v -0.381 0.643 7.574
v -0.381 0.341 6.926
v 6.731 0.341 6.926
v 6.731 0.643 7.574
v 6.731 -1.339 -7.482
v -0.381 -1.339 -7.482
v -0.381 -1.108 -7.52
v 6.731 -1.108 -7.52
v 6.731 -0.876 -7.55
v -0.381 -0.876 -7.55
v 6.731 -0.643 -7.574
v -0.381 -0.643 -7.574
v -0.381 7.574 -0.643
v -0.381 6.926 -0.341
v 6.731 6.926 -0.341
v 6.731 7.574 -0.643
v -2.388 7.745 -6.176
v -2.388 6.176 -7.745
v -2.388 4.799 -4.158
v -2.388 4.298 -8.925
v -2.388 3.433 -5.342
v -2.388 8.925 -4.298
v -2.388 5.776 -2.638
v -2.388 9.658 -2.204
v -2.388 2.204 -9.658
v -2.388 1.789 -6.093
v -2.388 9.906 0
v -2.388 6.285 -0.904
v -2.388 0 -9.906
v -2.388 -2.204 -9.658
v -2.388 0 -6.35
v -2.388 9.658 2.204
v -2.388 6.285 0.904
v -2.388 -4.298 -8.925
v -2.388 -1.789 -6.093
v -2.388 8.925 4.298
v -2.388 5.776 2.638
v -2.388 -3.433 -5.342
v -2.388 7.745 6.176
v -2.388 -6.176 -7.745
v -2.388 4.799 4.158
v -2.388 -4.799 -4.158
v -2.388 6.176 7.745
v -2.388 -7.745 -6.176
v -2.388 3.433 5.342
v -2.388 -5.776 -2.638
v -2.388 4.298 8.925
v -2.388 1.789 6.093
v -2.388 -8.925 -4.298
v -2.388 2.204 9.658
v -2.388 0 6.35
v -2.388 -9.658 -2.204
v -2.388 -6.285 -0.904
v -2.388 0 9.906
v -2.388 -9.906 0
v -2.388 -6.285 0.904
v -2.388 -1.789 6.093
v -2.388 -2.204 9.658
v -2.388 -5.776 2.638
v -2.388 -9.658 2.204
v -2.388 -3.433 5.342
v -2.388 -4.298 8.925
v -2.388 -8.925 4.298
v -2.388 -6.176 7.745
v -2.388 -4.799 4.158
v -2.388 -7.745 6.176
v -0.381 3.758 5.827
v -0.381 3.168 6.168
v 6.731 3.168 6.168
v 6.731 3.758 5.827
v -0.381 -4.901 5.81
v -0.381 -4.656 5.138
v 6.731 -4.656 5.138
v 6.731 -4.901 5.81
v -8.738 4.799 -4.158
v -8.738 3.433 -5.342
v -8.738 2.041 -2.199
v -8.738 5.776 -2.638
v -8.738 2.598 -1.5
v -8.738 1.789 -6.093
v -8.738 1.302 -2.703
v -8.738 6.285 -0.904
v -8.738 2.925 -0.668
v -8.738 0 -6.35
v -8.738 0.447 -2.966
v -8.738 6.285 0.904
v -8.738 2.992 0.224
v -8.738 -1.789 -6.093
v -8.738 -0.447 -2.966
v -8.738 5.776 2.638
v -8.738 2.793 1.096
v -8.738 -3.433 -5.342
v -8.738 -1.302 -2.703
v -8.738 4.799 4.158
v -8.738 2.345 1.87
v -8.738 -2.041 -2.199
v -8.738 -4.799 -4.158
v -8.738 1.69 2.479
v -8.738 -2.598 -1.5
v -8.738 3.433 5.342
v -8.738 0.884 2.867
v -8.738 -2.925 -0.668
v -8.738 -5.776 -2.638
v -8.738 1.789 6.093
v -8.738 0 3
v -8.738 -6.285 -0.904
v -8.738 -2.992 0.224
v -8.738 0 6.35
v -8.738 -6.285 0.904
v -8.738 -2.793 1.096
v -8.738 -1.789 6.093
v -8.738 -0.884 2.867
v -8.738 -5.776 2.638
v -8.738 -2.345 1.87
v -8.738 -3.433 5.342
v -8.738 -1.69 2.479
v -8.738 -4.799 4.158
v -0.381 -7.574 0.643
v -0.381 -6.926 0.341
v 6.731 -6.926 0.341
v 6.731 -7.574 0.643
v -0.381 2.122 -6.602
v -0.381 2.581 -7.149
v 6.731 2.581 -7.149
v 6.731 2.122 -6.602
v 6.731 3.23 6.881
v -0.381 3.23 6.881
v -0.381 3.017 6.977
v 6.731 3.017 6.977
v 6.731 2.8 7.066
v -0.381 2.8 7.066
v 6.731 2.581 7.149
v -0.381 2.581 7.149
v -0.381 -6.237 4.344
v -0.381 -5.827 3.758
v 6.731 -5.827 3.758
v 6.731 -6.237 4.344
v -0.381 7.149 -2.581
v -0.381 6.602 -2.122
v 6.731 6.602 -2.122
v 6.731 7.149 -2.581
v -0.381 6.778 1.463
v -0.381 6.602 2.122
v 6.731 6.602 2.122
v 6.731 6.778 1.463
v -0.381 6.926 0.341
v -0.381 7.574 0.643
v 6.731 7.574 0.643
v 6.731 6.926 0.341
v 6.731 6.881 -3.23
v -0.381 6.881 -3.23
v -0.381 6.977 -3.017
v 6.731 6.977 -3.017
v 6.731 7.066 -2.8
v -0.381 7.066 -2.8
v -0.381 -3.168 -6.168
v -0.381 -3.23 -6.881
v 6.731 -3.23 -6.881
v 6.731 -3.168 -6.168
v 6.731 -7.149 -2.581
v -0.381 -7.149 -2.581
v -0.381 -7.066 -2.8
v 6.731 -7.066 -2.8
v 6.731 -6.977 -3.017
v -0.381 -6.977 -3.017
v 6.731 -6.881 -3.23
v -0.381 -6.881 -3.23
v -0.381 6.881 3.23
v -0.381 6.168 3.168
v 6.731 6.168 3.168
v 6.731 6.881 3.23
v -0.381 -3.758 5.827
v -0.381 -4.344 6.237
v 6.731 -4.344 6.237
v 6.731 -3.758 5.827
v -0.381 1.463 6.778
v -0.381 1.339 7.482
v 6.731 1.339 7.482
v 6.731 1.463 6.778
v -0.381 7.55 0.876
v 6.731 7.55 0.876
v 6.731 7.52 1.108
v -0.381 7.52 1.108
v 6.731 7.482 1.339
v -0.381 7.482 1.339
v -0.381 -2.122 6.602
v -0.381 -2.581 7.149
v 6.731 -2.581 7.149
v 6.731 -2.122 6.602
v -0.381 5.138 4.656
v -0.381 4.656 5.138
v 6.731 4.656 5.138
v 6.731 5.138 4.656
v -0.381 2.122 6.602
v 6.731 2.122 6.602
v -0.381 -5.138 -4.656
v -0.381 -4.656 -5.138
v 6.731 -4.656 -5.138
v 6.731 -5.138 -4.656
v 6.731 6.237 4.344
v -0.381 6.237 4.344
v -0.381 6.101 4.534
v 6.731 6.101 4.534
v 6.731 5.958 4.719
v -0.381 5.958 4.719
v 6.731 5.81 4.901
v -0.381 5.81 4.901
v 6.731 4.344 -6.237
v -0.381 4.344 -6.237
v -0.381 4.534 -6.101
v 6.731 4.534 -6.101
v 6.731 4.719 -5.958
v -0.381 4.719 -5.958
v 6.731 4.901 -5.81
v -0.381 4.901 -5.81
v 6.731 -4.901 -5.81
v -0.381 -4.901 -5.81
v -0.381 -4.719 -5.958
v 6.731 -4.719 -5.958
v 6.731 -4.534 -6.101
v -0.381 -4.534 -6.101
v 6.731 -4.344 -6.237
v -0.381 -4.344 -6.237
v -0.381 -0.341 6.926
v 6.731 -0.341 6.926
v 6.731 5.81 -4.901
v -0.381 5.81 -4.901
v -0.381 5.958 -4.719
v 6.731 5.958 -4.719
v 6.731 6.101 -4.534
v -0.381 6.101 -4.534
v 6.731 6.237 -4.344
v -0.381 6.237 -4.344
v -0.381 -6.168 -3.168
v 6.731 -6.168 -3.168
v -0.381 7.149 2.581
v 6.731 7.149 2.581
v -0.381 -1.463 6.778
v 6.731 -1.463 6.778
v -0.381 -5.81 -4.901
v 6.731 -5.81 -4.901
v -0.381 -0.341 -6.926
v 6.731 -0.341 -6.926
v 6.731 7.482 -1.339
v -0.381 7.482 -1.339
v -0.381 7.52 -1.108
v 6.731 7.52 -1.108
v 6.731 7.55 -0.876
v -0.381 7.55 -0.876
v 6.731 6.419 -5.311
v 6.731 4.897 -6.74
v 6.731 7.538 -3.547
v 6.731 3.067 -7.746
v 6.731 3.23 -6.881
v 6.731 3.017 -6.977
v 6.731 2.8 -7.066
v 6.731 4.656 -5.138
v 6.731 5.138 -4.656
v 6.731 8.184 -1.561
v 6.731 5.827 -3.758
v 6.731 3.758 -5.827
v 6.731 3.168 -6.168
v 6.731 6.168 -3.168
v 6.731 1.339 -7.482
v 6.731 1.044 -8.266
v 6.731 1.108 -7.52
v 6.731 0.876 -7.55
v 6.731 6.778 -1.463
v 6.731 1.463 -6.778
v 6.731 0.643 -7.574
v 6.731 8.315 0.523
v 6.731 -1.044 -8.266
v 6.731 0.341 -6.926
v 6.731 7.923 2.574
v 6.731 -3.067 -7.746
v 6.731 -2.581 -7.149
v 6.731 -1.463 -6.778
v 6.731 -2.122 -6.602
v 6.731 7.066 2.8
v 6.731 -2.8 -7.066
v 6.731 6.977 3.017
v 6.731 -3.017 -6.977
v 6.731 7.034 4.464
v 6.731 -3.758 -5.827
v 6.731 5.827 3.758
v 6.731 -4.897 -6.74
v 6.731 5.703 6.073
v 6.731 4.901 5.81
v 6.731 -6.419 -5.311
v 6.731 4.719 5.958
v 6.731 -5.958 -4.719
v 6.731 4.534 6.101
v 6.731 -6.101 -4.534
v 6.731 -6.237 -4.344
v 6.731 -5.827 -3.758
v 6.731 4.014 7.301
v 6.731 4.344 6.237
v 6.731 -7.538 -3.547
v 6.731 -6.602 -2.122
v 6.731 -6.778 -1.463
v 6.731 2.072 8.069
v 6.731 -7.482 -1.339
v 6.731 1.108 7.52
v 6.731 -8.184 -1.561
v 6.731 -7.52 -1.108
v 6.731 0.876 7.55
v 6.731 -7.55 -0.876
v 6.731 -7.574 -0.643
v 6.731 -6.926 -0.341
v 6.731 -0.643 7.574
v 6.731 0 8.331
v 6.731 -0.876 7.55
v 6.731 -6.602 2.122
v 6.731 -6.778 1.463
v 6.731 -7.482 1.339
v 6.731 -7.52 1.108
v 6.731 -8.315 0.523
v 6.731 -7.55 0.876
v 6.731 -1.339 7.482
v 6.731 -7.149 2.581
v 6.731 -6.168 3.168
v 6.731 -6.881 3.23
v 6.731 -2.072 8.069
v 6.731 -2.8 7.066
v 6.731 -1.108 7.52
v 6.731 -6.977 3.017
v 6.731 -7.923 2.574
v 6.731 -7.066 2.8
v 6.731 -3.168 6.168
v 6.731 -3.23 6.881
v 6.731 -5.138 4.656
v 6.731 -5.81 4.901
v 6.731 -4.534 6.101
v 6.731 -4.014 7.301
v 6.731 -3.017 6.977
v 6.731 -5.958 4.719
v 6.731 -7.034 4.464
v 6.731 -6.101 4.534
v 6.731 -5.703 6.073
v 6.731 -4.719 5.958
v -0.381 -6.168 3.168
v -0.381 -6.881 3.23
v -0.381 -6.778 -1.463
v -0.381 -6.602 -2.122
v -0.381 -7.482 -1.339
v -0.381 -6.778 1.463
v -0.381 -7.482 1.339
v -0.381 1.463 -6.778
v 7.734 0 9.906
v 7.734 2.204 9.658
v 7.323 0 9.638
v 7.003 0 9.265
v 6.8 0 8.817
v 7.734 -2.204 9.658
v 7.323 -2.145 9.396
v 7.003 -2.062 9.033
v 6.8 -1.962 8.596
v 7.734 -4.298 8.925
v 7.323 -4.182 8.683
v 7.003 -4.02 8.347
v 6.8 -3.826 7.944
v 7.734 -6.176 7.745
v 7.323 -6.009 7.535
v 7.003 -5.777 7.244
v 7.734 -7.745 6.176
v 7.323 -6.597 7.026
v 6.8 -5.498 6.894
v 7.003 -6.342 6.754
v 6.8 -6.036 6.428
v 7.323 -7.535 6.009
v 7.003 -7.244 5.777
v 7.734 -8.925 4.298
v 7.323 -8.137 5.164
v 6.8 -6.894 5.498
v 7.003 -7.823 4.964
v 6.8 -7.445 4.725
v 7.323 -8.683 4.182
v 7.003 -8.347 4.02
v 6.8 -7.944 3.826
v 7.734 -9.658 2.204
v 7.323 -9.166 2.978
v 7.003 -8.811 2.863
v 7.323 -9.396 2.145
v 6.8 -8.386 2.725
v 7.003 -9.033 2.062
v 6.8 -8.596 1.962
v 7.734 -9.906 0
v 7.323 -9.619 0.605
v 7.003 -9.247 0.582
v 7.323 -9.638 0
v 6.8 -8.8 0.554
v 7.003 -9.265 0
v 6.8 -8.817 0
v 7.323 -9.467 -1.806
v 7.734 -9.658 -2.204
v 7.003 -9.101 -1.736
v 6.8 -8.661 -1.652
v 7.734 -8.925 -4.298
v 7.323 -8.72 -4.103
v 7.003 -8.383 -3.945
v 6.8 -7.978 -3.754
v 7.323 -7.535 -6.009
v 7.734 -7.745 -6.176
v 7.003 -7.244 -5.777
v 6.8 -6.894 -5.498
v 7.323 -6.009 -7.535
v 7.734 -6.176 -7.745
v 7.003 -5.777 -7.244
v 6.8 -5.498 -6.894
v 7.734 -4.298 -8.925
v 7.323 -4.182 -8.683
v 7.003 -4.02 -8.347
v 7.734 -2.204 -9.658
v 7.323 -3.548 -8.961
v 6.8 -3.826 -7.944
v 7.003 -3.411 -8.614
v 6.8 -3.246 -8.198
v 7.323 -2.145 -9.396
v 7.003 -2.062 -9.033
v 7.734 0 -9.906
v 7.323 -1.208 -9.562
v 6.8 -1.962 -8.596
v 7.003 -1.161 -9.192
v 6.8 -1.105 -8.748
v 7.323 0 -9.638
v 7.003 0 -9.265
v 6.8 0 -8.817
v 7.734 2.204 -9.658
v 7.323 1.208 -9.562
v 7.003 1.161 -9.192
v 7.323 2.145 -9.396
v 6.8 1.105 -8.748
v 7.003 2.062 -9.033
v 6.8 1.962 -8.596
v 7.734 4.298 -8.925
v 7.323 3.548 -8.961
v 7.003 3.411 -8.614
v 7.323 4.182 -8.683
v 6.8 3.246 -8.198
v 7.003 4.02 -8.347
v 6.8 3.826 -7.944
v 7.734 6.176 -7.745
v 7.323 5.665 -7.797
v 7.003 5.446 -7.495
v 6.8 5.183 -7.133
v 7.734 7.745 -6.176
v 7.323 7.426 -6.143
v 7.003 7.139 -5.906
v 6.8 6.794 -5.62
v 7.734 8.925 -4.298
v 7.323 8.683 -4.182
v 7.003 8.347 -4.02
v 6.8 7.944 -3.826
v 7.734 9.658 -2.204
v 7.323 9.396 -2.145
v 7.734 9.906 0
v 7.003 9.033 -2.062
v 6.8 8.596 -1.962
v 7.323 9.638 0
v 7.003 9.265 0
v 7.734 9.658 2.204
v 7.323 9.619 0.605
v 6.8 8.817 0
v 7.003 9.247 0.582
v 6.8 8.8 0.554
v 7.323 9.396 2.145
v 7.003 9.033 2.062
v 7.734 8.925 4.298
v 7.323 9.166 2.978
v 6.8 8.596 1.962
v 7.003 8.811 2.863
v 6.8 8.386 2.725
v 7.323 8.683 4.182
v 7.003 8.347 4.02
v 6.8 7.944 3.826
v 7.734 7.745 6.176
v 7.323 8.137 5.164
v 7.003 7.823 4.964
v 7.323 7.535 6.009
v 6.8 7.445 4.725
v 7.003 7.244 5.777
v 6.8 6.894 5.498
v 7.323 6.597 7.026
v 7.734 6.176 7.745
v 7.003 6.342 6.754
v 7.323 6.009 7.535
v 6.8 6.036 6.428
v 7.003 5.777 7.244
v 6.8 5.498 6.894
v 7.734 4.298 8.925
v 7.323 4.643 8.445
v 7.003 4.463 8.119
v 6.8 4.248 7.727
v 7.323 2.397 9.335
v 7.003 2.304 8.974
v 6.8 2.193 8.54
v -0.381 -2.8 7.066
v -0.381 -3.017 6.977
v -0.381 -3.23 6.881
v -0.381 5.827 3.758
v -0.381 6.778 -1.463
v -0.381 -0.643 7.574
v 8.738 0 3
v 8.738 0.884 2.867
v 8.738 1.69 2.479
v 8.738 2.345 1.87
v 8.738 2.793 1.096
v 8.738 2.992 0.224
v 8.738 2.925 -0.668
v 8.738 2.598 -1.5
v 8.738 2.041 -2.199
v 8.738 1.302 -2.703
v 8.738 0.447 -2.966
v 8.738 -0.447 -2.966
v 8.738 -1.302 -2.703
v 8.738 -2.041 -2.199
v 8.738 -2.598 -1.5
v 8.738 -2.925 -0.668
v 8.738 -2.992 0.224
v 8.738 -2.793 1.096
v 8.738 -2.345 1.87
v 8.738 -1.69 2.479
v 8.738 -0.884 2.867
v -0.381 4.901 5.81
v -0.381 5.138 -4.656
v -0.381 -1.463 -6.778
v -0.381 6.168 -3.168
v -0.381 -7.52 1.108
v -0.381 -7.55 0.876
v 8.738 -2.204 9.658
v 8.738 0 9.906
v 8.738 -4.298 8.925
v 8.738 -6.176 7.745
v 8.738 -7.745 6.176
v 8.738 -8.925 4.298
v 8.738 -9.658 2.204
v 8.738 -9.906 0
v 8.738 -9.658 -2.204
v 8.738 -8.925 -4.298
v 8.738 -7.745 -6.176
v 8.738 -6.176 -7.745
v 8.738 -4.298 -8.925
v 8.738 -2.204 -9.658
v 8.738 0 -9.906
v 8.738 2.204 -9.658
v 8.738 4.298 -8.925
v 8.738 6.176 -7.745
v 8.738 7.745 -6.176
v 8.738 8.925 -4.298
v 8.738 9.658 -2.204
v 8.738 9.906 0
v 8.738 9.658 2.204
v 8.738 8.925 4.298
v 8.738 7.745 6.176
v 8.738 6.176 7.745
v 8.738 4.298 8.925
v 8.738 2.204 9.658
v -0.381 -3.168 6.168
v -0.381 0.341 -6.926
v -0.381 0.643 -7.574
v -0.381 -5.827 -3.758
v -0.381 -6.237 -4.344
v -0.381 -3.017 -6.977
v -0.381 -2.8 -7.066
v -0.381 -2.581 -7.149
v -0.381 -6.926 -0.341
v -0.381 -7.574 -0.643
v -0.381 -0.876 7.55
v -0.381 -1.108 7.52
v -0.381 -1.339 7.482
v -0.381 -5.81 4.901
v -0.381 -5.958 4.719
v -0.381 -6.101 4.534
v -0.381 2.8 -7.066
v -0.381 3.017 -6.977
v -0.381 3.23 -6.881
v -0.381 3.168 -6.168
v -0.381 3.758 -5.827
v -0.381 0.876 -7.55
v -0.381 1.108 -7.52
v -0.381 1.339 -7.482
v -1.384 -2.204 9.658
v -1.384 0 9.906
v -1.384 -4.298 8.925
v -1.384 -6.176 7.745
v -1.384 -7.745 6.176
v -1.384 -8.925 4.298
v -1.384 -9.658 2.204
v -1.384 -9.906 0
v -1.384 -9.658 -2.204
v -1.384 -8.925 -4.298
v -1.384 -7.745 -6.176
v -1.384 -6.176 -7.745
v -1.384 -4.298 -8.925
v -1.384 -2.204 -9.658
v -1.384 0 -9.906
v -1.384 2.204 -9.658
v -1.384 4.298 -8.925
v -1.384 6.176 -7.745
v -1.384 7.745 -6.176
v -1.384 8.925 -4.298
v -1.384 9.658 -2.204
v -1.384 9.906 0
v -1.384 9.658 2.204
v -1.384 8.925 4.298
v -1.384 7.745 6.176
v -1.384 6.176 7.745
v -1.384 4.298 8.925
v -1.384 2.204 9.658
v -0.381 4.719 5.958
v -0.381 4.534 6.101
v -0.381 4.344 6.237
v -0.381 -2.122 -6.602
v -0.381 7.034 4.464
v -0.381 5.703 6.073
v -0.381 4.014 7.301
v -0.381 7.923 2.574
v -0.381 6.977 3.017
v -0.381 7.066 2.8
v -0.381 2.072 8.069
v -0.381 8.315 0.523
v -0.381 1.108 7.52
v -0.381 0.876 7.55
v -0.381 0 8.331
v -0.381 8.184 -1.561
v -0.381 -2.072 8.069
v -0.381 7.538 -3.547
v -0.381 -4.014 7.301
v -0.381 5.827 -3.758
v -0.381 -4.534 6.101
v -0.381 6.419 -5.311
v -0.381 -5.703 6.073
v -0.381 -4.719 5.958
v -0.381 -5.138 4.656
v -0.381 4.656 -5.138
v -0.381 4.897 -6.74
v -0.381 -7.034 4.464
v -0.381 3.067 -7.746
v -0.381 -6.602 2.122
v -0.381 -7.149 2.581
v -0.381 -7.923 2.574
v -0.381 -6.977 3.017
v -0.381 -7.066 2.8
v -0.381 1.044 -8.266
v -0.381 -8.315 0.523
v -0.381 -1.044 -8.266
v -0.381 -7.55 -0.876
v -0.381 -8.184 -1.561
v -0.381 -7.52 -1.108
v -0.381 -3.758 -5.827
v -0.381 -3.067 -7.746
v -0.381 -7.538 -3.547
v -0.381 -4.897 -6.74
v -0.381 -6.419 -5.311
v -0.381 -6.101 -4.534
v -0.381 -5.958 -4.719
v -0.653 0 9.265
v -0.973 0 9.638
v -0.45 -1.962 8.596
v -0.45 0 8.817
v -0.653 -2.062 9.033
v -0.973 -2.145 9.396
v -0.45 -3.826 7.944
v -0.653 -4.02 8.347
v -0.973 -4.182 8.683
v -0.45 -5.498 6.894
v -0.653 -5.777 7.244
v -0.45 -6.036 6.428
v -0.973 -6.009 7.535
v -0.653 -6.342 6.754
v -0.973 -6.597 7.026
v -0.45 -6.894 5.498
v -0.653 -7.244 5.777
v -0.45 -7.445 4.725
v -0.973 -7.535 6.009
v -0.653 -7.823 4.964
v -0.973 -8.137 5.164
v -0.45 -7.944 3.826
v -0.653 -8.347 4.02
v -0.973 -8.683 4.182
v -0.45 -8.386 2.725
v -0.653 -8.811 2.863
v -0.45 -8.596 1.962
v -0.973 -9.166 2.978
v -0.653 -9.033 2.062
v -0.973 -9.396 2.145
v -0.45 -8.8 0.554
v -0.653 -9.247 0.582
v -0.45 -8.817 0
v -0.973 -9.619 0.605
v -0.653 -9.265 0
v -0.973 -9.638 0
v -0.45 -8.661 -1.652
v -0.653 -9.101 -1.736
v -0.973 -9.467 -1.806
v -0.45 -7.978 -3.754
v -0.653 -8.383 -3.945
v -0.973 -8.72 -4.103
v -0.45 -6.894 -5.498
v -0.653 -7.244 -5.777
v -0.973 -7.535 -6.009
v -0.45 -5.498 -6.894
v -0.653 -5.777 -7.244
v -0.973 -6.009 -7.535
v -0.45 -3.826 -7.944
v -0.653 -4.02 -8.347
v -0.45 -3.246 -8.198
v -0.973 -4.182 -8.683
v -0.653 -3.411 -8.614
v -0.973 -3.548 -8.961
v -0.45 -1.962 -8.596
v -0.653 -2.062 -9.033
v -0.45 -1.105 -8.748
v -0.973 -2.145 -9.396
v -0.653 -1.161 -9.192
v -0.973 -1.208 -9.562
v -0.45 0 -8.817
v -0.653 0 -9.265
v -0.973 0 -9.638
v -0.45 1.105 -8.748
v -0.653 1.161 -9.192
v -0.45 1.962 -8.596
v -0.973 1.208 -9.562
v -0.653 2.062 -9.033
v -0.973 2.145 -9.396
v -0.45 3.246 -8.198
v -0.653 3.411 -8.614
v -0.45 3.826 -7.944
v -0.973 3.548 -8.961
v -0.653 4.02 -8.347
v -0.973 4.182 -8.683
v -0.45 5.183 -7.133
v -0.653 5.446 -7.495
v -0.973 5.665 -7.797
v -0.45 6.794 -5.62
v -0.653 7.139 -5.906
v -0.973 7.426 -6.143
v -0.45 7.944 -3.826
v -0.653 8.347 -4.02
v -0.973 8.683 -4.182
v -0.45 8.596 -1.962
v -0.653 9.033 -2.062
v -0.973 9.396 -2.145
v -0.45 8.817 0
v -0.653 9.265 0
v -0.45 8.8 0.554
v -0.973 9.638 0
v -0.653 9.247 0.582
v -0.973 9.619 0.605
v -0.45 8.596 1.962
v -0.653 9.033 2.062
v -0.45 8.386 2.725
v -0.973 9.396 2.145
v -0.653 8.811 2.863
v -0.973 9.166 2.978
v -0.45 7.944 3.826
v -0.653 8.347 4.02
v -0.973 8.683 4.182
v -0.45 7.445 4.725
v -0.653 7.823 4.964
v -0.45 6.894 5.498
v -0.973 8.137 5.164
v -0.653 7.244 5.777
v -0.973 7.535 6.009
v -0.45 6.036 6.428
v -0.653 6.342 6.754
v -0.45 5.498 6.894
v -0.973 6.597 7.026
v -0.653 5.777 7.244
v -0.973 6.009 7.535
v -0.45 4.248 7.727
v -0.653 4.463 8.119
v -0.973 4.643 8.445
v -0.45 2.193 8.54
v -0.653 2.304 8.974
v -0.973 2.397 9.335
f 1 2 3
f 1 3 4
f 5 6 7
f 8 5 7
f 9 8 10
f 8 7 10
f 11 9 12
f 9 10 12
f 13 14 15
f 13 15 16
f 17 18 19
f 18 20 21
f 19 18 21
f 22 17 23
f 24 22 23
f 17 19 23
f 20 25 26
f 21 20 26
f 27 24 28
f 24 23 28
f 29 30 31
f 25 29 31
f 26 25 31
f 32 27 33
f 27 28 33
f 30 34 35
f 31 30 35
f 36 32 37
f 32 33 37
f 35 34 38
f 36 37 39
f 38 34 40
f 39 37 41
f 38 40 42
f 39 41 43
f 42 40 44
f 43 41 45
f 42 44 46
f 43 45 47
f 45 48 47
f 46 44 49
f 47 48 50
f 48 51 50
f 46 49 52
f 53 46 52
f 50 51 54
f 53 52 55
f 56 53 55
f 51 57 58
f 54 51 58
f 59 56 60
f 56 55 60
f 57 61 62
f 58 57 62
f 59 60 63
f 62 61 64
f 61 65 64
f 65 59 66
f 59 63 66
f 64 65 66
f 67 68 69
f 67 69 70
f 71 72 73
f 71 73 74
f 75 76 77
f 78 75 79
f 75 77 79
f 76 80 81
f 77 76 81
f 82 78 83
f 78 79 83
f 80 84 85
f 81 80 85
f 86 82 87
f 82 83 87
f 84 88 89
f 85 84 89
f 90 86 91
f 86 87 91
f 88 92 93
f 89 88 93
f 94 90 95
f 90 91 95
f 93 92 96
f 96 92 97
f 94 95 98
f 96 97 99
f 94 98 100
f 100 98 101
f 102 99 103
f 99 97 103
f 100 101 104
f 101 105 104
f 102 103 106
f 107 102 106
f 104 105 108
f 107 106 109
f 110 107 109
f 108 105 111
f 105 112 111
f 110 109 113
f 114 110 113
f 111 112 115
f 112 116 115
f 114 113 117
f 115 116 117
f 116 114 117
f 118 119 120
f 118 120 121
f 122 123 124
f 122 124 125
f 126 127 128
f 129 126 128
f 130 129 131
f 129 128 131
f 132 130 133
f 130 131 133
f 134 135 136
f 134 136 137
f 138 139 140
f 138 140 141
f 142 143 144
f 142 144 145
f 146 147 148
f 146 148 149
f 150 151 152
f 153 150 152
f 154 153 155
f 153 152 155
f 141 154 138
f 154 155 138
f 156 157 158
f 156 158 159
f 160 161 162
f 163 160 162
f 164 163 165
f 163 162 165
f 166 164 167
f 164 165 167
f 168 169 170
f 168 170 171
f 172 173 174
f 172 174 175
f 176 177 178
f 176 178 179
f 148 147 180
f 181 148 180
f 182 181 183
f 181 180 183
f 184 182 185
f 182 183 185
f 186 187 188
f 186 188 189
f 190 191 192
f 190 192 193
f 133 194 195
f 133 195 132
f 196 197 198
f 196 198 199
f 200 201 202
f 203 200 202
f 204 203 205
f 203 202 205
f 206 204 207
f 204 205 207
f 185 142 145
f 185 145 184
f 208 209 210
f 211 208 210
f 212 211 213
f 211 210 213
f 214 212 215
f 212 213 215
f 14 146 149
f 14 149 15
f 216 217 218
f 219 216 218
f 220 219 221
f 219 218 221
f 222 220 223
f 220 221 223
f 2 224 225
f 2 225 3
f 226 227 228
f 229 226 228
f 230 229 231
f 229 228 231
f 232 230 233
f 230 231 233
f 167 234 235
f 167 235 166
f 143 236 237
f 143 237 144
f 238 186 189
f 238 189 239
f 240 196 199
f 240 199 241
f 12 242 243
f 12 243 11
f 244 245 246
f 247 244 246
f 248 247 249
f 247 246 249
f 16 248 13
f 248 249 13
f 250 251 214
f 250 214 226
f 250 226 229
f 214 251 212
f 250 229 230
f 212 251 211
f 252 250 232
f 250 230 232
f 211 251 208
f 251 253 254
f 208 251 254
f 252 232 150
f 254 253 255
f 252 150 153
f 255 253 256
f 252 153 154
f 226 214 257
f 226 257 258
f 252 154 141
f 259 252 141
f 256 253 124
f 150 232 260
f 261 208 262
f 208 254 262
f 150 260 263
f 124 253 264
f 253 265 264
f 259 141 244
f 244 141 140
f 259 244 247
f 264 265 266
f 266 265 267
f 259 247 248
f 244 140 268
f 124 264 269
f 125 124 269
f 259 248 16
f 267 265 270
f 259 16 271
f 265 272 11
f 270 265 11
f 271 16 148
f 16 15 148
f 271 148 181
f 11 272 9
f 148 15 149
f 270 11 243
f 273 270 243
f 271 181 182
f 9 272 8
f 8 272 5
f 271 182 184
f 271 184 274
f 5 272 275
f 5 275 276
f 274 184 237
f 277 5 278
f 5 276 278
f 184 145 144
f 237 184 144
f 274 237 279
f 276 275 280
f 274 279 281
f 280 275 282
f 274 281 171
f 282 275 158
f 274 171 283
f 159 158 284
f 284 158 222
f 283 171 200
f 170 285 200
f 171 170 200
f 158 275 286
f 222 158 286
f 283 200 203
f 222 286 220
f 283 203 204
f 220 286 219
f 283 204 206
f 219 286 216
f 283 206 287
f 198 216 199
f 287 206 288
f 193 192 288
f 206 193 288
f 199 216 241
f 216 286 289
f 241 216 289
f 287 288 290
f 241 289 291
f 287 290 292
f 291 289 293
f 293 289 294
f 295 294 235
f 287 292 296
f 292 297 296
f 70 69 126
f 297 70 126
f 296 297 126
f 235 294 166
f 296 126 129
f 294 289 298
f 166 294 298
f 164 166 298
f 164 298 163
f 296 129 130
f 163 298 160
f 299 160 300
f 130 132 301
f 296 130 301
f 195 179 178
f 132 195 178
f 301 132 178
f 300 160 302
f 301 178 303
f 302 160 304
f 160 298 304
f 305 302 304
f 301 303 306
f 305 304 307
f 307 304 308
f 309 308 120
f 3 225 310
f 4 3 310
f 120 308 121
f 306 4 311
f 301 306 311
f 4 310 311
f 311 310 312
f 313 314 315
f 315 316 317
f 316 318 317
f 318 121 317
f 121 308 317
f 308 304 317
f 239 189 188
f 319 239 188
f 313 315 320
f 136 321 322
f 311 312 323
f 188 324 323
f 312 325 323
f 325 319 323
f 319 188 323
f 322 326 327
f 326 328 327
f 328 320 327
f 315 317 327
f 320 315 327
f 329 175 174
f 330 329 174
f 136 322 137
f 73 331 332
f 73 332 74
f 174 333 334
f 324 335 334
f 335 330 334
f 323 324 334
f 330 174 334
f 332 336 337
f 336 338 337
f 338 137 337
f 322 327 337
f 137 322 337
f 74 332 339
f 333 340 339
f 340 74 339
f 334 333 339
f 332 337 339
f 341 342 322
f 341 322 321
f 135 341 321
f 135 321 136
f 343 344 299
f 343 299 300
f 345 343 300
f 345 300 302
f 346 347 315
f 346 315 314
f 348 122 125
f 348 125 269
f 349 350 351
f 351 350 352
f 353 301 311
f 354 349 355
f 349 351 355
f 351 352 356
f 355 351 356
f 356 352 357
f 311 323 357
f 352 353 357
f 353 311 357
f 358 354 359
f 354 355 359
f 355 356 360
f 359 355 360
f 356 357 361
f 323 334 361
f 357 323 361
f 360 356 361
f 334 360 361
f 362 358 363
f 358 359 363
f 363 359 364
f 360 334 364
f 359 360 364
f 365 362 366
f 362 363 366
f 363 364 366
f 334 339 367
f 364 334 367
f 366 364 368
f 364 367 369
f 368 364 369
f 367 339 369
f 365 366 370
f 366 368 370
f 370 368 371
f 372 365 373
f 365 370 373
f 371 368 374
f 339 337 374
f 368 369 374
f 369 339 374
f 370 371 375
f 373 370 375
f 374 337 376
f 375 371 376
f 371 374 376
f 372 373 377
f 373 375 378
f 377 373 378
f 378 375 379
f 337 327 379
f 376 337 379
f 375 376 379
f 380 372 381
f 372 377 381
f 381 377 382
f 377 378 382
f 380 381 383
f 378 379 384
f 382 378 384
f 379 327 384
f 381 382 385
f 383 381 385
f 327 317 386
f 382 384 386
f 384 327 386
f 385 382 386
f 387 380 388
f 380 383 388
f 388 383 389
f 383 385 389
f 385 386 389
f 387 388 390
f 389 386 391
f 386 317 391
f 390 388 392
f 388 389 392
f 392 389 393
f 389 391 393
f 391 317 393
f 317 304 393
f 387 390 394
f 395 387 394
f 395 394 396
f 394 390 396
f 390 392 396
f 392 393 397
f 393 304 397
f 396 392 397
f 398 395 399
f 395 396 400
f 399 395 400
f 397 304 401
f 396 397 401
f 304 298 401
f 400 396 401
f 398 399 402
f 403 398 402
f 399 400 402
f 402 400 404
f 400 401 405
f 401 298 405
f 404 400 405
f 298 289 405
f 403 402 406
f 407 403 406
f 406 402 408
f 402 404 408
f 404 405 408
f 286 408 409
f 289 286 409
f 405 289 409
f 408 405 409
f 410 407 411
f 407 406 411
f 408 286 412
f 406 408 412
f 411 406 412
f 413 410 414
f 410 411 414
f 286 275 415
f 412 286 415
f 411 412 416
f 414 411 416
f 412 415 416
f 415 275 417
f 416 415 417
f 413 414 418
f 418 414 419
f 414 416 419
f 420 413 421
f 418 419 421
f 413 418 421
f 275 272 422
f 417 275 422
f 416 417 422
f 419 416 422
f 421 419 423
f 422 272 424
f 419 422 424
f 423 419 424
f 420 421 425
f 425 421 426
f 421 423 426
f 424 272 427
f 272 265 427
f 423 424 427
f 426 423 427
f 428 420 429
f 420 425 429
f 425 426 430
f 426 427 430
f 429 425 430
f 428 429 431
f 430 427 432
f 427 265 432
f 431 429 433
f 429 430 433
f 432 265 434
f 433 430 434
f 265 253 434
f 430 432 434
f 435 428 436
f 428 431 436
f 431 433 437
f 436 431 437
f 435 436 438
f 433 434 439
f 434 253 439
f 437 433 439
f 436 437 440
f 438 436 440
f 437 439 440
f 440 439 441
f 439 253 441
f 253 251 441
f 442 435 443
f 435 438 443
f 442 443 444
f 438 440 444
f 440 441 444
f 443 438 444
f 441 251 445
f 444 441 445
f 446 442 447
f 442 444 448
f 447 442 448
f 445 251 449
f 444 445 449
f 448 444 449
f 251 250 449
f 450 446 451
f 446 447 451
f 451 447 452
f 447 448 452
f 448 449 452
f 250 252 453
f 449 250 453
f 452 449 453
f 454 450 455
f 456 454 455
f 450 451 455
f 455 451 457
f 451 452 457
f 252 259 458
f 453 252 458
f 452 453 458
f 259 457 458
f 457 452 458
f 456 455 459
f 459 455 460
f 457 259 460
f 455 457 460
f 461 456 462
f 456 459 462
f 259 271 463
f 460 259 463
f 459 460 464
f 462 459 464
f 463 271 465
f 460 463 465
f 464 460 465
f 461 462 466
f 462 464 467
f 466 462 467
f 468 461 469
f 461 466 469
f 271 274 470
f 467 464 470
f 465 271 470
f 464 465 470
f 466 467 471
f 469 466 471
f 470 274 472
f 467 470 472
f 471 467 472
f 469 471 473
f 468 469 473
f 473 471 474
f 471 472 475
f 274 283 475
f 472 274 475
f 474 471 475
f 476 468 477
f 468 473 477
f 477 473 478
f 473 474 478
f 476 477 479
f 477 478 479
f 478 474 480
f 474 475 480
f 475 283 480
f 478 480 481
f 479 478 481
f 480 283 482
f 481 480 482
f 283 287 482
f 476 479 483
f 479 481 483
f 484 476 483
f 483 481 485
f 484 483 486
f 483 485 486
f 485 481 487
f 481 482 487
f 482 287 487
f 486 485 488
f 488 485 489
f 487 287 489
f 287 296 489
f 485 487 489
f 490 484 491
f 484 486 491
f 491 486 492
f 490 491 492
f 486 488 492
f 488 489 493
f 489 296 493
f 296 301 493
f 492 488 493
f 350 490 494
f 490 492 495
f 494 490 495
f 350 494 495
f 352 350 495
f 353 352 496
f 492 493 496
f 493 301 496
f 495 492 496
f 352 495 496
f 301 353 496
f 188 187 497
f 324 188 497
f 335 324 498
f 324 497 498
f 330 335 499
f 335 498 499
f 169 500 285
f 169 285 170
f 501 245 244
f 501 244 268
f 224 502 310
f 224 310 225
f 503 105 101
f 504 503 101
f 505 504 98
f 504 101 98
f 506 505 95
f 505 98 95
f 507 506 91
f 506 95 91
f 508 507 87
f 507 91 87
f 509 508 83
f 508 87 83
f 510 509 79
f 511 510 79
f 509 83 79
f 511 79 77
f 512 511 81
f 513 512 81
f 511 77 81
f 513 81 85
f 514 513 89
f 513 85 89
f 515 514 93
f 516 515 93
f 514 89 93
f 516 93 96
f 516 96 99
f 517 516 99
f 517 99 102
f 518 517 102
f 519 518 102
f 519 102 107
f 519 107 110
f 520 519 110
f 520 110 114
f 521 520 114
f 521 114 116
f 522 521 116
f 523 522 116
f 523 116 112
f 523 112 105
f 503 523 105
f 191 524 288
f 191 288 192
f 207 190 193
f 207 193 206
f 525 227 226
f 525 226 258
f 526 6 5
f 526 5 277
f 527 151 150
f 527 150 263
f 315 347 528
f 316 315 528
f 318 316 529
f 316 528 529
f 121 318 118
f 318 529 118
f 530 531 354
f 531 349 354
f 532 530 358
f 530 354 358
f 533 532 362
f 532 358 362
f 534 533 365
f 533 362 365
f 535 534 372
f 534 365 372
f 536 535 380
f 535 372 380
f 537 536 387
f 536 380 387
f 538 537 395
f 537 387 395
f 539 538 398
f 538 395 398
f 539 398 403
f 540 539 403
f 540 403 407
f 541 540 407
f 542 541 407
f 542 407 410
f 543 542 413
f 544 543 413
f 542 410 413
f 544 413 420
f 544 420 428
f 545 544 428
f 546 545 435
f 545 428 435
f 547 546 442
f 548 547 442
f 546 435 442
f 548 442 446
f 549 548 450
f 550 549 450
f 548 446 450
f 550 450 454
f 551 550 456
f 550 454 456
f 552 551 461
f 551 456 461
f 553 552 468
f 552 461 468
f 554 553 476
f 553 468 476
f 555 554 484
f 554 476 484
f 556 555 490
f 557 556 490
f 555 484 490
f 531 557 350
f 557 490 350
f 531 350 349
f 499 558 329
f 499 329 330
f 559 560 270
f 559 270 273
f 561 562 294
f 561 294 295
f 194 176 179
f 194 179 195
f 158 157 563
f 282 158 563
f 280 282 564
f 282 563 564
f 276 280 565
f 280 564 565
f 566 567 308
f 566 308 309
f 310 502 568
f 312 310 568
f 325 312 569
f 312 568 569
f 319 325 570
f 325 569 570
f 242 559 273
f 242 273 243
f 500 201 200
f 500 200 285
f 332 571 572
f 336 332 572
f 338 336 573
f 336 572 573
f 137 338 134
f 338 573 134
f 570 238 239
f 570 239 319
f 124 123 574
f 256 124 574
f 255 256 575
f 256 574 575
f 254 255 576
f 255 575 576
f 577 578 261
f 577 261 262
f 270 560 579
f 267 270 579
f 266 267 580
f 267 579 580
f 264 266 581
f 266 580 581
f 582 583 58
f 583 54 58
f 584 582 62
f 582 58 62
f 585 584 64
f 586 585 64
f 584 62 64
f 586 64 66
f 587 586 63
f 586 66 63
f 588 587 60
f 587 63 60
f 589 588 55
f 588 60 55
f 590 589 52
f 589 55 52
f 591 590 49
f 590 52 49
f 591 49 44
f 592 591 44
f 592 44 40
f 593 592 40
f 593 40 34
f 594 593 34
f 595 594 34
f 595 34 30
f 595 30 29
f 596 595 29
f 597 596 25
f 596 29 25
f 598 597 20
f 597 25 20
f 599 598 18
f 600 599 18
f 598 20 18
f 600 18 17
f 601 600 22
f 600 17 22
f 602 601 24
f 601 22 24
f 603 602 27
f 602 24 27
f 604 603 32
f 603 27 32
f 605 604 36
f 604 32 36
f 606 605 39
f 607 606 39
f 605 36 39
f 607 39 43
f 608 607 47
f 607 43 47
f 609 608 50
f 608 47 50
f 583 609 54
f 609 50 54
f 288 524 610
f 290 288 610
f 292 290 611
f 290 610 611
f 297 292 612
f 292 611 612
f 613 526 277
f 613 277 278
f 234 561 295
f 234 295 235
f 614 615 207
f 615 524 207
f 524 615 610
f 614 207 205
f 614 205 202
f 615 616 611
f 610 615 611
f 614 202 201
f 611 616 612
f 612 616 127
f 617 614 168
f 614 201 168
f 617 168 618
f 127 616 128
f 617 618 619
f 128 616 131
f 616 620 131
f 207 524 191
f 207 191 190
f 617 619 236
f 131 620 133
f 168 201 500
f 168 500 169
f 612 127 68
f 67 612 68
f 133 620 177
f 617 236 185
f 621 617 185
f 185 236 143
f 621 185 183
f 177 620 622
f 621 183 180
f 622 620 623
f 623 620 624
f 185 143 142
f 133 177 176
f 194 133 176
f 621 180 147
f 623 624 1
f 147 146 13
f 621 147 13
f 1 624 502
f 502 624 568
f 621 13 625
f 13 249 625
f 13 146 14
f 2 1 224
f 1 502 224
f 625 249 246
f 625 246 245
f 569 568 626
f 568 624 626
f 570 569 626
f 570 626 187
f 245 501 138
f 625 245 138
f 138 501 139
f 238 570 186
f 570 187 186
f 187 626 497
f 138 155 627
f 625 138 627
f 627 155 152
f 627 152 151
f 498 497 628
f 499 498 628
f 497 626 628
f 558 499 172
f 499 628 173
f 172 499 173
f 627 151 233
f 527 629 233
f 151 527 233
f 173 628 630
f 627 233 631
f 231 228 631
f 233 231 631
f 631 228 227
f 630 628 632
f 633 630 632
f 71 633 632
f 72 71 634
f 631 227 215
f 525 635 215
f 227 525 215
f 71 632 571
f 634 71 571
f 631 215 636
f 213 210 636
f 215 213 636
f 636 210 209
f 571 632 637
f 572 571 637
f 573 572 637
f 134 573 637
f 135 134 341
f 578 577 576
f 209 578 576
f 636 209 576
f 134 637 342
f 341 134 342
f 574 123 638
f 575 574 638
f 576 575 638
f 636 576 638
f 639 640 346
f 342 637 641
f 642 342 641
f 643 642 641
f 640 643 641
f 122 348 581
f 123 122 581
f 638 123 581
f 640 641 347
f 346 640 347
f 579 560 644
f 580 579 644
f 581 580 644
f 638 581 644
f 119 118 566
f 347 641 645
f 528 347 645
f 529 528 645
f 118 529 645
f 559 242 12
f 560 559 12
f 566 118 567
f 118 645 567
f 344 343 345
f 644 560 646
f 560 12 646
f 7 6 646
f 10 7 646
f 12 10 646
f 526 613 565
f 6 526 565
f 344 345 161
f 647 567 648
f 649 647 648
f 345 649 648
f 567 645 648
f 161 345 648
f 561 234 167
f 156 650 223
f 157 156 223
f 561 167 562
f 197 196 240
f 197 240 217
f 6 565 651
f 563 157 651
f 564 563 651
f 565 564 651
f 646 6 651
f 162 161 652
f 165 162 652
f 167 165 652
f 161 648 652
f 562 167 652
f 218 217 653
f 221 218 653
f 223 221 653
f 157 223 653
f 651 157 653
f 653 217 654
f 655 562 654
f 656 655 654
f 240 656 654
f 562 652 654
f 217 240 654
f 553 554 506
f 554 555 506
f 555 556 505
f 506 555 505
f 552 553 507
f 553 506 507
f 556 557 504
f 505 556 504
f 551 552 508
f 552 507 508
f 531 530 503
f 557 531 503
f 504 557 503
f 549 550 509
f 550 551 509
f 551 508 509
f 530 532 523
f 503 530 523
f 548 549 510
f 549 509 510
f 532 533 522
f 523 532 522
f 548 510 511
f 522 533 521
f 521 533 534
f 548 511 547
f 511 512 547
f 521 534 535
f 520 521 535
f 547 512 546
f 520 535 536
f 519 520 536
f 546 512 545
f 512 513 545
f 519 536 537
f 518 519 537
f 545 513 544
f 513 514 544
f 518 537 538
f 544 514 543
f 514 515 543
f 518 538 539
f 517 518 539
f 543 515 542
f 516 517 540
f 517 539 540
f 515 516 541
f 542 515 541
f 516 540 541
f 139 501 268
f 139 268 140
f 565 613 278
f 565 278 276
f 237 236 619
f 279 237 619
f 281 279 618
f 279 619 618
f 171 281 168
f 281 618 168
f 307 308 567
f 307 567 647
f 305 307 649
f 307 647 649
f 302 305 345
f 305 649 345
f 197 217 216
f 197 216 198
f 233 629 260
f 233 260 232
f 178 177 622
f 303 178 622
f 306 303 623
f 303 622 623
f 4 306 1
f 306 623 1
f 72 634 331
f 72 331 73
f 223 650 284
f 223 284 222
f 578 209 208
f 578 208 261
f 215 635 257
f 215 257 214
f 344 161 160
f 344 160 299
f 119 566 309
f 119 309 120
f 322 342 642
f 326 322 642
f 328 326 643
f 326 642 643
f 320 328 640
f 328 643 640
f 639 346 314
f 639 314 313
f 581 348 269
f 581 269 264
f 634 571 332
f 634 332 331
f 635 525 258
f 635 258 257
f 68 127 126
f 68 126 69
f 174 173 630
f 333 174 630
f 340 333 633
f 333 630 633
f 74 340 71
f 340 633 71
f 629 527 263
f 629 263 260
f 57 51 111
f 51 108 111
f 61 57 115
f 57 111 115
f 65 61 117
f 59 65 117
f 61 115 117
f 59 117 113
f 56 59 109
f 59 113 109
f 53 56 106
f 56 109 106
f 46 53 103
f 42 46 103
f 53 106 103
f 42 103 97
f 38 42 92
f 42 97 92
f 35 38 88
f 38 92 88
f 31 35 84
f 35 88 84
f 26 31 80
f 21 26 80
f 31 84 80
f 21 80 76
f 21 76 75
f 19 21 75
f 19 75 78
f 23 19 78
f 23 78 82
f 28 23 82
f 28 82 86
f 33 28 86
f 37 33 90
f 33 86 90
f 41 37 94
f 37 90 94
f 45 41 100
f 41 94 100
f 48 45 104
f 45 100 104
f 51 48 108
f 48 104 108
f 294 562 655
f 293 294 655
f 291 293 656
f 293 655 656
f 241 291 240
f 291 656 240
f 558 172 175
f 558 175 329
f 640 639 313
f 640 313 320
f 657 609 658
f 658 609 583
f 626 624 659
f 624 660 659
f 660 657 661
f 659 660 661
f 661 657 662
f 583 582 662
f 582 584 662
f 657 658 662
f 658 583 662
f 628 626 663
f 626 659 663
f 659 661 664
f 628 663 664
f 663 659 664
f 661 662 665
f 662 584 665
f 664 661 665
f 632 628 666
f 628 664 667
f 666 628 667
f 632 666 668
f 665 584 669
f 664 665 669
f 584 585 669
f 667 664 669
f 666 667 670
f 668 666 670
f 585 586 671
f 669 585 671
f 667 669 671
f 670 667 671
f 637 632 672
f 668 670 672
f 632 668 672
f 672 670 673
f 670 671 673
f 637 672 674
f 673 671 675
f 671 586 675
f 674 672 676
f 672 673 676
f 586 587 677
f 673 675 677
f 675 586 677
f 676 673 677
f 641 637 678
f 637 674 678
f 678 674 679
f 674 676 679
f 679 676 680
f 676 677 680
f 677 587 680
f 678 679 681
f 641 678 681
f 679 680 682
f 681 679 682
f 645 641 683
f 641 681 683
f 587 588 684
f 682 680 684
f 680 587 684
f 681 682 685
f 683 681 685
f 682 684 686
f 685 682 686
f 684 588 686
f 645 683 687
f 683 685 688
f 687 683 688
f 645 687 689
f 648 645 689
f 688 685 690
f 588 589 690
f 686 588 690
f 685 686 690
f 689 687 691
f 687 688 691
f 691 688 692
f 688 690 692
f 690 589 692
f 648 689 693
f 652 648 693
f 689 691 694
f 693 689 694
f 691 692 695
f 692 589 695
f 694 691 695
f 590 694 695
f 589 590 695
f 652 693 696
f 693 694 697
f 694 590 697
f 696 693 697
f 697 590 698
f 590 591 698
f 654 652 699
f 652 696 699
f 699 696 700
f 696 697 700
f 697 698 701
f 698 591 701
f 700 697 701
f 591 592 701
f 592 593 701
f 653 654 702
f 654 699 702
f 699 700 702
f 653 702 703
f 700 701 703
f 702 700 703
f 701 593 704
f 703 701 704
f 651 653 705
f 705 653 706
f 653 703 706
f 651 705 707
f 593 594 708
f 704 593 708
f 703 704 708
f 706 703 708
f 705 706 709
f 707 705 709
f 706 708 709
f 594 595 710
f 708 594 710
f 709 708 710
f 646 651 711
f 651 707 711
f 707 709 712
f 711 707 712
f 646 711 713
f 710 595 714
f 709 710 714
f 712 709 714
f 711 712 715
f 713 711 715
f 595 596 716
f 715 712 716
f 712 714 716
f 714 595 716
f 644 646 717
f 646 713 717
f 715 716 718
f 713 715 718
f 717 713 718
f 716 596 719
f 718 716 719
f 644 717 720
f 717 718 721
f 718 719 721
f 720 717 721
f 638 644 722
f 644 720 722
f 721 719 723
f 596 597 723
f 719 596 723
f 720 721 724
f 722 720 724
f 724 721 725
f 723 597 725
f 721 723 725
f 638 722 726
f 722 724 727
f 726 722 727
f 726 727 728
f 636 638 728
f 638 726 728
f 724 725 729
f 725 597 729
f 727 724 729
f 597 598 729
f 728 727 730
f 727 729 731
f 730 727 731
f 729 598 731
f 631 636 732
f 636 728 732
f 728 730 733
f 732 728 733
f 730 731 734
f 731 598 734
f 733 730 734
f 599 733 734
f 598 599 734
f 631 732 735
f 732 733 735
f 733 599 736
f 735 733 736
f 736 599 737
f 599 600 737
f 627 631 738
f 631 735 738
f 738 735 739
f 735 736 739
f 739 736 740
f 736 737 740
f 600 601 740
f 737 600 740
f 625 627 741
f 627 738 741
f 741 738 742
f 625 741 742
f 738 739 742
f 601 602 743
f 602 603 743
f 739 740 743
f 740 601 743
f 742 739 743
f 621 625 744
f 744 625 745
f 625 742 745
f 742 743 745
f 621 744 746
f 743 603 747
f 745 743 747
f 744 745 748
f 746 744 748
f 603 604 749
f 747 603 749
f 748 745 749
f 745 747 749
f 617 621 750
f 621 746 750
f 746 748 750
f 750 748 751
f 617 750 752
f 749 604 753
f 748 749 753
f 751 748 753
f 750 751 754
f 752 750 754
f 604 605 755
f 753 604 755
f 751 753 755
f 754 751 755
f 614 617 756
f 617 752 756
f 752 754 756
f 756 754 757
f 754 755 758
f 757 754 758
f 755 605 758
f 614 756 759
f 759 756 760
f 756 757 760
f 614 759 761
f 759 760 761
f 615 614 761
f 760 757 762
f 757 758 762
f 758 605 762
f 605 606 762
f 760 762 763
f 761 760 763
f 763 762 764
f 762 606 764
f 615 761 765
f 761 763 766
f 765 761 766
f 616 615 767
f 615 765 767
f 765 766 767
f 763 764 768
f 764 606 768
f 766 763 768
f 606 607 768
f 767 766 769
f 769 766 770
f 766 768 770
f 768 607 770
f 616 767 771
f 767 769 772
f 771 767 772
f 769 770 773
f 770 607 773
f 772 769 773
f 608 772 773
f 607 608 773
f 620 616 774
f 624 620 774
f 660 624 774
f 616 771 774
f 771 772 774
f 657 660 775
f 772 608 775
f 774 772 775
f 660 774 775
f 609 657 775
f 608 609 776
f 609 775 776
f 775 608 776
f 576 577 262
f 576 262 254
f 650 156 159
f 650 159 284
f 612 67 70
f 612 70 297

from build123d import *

# Parameters (mm, degrees)
SKETCH4_R          = 7.7597
SKETCH4_R_2        = 7.60095
CUT_EXTRUDE2_DEPTH = 7.112
CUT_EXTRUDE1_DEPTH = 7.112
CIRPATTERN1_COUNT  = 24
SKETCH6_R          = 3
CUT_EXTRUDE3_DEPTH = 23.397327676


with BuildPart() as part:
    # Sketch1 → Revolve1 (revolve)
    with BuildSketch(Plane.XY, mode=Mode.PRIVATE) as revolve1_sk:
        with BuildLine():
            Line((-8.7376, 2.38125), (8.7376, 2.38125))
            Line((8.7376, 2.38125), (8.7376, 9.906))
            Line((8.7376, 9.906), (7.7343, 9.906))
            ThreePointArc((7.7343, 9.906), (7.003135774, 9.264822773), (6.731, 8.3312))
            Line((6.731, 8.3312), (6.731, 7.7597))
            Line((6.731, 7.7597), (-0.381, 7.7597))
            Line((-0.381, 7.7597), (-0.381, 8.3312))
            ThreePointArc((-0.381, 8.3312), (-0.653135774, 9.264822773), (-1.3843, 9.906))
            Line((-1.3843, 9.906), (-2.3876, 9.906))
            Line((-2.3876, 9.906), (-2.3876, 6.35))
            Line((-2.3876, 6.35), (-8.7376, 6.35))
            Line((-8.7376, 6.35), (-8.7376, 2.38125))
        make_face()
    revolve(revolve1_sk.sketch.rotate(Axis((-8.7376, 0, 0), (1, 0, 0)), 90), axis=Axis((-8.7376, 0, 0), (1, 0, 0)))

    # Sketch4 → Cut-Extrude2 (cut)
    with BuildSketch(Plane(origin=(-0.381, 0, 0), x_dir=(0, 0, -1), z_dir=(1, 0, 0))):
        Circle(SKETCH4_R)
        with Locations(Location((0, 0, 0), (0, 0, 180))):
            Circle(SKETCH4_R_2, mode=Mode.SUBTRACT)
    extrude(amount=CUT_EXTRUDE2_DEPTH, mode=Mode.SUBTRACT)

    # Sketch3 → Cut-Extrude1 (cut)
    with BuildSketch(Plane(origin=(-0.381, 0, 0), x_dir=(0, 0, -1), z_dir=(1, 0, 0))):
        with BuildLine():
            Line((-0.643066132, 7.57369836), (-0.340952079, 6.925812683))
            Line((-0.340952079, 6.925812683), (0.340952079, 6.925812683))
            Line((0.340952079, 6.925812683), (0.643066132, 7.57369836))
            ThreePointArc((0.643066132, 7.57369836), (0, 7.60095), (-0.643066132, 7.57369836))
        make_face()
    cut_extrude1 = extrude(amount=CUT_EXTRUDE1_DEPTH, mode=Mode.SUBTRACT)

    # CirPattern1: Cut-Extrude1 ×24 about axis
    cirpattern1_axis = Axis((0, 0, 0), (1, 0, 0))
    for i in range(1, CIRPATTERN1_COUNT):
        add(cut_extrude1.rotate(cirpattern1_axis, i * 360 / CIRPATTERN1_COUNT), mode=Mode.SUBTRACT)

    # Sketch6 → Cut-Extrude3 (cut, through all)
    with BuildSketch(Plane.ZY.offset(8.7376)):
        Circle(SKETCH6_R)
    extrude(amount=-CUT_EXTRUDE3_DEPTH, mode=Mode.SUBTRACT)


solid = part.part
